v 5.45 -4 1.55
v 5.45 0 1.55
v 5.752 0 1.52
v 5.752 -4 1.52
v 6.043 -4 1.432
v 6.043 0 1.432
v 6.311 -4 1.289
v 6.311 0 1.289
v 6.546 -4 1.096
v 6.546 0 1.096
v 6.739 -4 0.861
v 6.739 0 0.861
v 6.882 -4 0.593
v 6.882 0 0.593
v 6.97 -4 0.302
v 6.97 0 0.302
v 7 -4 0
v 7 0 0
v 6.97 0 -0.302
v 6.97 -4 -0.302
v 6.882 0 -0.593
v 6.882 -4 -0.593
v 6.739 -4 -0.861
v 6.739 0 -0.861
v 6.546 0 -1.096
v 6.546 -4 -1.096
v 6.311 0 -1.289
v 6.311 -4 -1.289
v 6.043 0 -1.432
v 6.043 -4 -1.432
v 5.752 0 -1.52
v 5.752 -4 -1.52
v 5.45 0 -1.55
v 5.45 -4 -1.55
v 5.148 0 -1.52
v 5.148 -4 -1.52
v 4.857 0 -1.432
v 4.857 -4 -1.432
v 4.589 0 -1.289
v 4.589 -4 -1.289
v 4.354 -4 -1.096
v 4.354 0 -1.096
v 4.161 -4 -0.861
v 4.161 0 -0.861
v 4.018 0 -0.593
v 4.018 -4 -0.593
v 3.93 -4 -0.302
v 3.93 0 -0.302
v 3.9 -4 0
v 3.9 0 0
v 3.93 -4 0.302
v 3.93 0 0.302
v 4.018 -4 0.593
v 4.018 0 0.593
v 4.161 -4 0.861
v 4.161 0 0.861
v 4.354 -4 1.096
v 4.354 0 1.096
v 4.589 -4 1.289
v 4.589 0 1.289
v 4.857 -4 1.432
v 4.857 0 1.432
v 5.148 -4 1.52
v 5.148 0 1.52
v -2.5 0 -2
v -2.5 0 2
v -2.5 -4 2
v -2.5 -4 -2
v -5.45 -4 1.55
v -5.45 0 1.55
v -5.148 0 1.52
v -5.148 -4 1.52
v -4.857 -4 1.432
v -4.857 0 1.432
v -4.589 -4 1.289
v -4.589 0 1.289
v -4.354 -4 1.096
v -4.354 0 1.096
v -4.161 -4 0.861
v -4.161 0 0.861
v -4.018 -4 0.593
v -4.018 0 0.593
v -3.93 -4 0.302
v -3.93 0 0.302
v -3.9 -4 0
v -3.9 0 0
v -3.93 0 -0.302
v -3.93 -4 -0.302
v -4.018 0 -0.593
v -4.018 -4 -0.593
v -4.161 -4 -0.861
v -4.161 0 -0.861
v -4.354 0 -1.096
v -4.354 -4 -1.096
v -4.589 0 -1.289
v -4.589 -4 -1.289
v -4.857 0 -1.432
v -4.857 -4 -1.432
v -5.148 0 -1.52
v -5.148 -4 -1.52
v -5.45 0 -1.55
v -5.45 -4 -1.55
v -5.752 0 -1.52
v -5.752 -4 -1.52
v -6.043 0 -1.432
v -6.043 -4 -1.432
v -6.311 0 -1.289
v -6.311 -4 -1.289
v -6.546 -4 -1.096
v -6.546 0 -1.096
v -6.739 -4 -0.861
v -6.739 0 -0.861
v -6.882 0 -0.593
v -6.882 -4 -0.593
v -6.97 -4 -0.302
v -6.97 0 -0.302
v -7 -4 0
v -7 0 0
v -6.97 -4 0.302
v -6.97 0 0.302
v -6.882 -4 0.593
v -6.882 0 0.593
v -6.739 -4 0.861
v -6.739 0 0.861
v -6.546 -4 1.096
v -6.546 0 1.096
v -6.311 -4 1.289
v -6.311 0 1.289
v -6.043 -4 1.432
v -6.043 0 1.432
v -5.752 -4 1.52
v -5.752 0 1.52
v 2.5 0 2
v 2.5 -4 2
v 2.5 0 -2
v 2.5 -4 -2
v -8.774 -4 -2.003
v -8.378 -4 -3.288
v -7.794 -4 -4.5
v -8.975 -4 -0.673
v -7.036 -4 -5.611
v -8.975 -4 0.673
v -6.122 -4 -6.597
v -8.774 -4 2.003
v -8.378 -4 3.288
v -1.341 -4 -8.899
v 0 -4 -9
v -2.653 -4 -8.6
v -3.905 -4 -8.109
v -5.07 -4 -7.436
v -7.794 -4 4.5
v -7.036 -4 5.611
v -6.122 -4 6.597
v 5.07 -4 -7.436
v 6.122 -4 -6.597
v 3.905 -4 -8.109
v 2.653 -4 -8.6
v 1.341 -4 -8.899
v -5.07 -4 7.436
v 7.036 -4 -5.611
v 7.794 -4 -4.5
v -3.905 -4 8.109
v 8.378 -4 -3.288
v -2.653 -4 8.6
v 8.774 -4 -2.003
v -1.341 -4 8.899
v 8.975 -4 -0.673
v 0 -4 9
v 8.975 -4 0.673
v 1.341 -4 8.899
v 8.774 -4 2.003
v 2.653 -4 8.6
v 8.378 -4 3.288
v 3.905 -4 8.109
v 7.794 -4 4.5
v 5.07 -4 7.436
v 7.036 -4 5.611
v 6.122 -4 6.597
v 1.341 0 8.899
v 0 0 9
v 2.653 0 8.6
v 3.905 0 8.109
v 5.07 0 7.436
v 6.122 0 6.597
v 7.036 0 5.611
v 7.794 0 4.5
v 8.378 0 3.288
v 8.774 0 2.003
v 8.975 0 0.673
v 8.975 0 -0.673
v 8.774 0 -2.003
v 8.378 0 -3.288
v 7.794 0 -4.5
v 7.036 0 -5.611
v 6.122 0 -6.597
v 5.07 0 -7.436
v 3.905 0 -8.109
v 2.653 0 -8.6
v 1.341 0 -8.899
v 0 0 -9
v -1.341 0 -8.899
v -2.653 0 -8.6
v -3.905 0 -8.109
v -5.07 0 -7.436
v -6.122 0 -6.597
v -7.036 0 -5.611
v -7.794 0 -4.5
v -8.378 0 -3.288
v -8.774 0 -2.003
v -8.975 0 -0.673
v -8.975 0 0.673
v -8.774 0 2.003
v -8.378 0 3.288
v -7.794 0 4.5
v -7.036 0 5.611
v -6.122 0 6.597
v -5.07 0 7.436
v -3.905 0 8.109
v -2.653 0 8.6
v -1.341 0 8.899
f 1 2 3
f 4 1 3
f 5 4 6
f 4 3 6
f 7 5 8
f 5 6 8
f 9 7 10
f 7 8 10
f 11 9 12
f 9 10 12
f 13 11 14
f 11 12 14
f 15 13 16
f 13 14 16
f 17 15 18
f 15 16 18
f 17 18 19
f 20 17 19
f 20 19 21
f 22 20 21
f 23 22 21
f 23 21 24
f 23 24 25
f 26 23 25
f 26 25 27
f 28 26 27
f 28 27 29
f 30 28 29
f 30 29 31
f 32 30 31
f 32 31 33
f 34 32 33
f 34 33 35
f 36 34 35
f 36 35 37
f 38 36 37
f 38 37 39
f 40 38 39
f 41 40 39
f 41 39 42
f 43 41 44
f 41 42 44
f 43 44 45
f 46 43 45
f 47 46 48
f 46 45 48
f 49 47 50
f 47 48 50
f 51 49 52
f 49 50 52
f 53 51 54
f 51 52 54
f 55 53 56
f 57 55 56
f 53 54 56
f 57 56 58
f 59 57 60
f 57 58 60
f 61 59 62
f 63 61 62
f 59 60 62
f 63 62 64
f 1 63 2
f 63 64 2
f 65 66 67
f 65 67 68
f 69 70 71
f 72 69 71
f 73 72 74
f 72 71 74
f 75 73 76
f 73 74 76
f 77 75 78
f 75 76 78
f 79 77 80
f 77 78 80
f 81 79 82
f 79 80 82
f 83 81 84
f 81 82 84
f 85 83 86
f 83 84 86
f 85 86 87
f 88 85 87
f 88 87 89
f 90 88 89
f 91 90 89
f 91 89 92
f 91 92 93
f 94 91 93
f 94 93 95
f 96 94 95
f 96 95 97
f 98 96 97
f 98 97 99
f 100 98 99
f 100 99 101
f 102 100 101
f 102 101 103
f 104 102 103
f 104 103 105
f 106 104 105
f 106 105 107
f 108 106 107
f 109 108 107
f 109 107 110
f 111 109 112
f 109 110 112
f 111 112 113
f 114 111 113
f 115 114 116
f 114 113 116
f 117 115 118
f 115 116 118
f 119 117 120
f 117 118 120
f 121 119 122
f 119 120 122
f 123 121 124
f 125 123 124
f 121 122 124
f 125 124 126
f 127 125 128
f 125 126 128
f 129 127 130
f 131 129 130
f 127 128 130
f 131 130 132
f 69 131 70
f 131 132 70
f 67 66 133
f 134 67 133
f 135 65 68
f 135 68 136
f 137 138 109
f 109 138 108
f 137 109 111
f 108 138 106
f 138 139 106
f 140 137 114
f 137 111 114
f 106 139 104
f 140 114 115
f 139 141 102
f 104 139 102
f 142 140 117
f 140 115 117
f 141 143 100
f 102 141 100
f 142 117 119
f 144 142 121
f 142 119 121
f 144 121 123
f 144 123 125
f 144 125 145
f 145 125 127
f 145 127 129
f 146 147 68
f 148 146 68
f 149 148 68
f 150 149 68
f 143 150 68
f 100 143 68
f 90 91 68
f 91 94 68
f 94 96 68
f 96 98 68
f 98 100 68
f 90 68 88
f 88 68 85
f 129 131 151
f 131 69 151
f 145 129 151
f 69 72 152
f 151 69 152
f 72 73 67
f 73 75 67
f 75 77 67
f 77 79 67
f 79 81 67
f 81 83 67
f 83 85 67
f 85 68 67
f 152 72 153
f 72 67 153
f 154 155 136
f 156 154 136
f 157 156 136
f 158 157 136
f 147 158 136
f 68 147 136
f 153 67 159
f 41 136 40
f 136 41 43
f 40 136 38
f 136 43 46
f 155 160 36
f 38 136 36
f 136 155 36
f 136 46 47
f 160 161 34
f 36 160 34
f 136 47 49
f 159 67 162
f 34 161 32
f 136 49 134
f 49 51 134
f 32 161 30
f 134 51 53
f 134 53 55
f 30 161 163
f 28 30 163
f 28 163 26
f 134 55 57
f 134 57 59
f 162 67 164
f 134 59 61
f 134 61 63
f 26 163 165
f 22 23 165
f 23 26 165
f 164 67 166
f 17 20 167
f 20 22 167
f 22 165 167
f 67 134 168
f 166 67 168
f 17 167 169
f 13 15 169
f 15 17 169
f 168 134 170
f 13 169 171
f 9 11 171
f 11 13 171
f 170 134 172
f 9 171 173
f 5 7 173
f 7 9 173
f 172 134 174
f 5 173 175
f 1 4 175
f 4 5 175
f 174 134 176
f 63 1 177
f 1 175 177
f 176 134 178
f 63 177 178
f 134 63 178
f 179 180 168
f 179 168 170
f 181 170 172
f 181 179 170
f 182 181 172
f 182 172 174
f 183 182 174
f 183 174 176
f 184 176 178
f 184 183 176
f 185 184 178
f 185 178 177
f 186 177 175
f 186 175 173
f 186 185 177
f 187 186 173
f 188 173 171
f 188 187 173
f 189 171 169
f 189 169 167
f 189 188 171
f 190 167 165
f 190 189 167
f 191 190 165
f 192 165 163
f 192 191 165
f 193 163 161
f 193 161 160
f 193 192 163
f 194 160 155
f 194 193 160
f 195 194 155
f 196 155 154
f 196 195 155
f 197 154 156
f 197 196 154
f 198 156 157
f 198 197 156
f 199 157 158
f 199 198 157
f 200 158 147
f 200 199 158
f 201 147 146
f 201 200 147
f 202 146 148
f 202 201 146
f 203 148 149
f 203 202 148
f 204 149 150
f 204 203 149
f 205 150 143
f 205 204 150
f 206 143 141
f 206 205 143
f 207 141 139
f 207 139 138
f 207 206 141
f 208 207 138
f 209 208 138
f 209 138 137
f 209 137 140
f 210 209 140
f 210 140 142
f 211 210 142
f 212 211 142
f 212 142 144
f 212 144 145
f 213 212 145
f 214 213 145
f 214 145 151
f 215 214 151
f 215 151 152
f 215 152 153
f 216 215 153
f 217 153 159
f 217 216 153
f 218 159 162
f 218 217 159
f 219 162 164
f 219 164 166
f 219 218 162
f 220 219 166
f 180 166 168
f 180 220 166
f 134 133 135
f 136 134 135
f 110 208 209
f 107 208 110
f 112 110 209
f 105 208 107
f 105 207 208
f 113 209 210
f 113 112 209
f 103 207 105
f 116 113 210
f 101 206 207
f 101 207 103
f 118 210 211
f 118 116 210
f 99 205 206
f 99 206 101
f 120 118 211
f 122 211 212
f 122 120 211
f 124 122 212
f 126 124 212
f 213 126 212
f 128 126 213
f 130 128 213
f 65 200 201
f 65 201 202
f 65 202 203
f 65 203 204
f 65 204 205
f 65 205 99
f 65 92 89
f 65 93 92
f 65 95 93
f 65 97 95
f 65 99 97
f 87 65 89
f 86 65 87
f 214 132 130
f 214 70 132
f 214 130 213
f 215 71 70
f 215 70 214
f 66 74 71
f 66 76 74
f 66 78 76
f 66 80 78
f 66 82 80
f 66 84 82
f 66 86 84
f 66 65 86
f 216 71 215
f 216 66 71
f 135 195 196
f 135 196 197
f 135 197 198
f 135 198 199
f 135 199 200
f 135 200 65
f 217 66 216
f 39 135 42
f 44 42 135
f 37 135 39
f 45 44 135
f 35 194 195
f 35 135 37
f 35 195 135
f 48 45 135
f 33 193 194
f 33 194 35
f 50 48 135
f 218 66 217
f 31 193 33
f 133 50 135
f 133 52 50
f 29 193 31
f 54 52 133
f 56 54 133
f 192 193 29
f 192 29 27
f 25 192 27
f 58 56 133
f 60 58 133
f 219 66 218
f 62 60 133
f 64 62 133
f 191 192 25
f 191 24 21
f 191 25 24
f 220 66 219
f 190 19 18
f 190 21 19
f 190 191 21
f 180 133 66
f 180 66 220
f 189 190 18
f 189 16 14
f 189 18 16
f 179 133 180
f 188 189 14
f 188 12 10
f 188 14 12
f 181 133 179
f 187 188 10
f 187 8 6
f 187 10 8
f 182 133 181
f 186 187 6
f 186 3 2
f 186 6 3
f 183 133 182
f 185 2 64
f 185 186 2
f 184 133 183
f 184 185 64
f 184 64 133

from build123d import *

# Parameters (mm, degrees)
SKETCH1_R          = 9
BASE_FLANGE1_DEPTH = 4
SKETCH7_R          = 1.55
CUT_EXTRUDE2_DEPTH = 10
SKETCH8_W          = 5
SKETCH8_H          = 4
CUT_EXTRUDE3_DEPTH = 10


# Sheet-metal steps are written as plain solids
with BuildPart() as part:
    # Sketch1 → Base-Flange1 (new body)
    with BuildSketch(Plane(origin=(0, 0, 0), x_dir=(1, 0, 0), z_dir=(0, 1, 0))):
        with Locations(Location((0, 0, 0), (0, 0, 270))):
            Circle(SKETCH1_R)
    extrude(amount=-BASE_FLANGE1_DEPTH)

    # Sketch7 → Cut-Extrude2 (cut)
    with BuildSketch(Plane(origin=(0, 0, 0), x_dir=(1, 0, 0), z_dir=(0, 1, 0))):
        with Locations(Location((-5.45, 0, 0), (0, 0, 270))):
            Circle(SKETCH7_R)
        with Locations(Location((5.45, 0, 0), (0, 0, 270))):
            Circle(SKETCH7_R)
    extrude(amount=-CUT_EXTRUDE2_DEPTH, mode=Mode.SUBTRACT)

    # Sketch8 → Cut-Extrude3 (cut)
    with BuildSketch(Plane(origin=(0, 0, 0), x_dir=(1, 0, 0), z_dir=(0, 1, 0))):
        Rectangle(SKETCH8_W, SKETCH8_H)
    extrude(amount=-CUT_EXTRUDE3_DEPTH, mode=Mode.SUBTRACT)


solid = part.part
